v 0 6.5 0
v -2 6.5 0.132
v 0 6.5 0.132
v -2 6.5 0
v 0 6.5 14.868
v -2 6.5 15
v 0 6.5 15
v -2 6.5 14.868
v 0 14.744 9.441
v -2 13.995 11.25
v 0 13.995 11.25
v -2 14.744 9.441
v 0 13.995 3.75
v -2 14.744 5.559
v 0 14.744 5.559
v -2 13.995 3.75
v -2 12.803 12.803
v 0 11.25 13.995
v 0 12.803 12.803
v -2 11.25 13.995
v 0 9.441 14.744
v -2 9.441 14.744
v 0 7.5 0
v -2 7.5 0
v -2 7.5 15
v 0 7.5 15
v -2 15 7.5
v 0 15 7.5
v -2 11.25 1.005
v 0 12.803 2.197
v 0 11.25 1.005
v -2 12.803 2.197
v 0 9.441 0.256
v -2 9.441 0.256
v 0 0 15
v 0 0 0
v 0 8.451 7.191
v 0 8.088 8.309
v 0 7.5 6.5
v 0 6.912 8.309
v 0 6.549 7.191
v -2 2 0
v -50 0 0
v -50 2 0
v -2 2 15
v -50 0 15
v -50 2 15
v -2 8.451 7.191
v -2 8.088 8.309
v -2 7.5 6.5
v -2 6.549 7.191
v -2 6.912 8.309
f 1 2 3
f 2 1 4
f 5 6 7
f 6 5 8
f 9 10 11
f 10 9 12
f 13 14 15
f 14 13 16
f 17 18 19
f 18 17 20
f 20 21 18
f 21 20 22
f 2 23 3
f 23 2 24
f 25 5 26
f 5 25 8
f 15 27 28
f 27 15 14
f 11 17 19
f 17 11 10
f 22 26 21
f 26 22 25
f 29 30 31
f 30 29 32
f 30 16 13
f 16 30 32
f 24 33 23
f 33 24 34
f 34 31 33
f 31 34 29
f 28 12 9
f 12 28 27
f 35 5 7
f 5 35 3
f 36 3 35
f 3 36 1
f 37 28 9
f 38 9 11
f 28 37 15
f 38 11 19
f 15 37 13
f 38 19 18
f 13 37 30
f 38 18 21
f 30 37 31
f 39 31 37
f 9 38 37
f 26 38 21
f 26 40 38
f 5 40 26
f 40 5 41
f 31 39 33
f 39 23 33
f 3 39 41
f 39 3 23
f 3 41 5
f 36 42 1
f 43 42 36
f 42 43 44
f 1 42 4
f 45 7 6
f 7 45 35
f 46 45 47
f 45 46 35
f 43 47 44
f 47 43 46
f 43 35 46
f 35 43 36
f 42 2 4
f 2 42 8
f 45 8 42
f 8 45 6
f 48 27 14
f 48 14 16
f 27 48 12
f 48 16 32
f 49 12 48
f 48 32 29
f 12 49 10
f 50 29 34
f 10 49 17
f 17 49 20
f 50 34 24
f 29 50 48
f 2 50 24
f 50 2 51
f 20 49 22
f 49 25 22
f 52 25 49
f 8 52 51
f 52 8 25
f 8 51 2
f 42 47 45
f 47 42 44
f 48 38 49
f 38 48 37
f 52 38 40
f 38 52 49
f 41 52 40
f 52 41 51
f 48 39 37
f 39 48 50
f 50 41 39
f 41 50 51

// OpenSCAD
$h = 15;
$l = 50;
$thick = 50;
$r = 7.5;
$hole_r = 1;
$hole_offset = 2;
$notch_h = 5;
$notch_w = 8;
$standoff_r = 2;

difference() {
	translate([0, $h+$thick, $h]) {
		rotate([180, 0, 0]) {
			intersection() {
				// large cylinder
				union() {
					translate([-$thick*2, $r+$thick+1, -1]) {
						cube([$thick*3, $r, $h+2]);
					}
					translate([-$thick*1.5, $r+$thick, $h/2]) {
						rotate([0, 90, 0]) {
							cylinder(h = $thick*2, r = $r);
						}
					}
				}
				// end piece
				translate([-$thick, $thick, 0]) {
					cube([$thick, $r*2, $h]);
				}
			}
			// pivot hole
			translate([-$thick*1.5, $r+$thick, $h/2]) {
				rotate([0, 90, 0]) {
					//cylinder(h = $thick*2, r = $hole_r);
				}
			}
		}
	}
	translate([-$thick-2, 2, -1]) {
		cube([$thick, $r*2, $h+2]);
	}
	translate([-3, $r, $r]) {
		rotate([0, 90, 0]) {
			cylinder(h = 4, r = 1);
		}
	}
}
